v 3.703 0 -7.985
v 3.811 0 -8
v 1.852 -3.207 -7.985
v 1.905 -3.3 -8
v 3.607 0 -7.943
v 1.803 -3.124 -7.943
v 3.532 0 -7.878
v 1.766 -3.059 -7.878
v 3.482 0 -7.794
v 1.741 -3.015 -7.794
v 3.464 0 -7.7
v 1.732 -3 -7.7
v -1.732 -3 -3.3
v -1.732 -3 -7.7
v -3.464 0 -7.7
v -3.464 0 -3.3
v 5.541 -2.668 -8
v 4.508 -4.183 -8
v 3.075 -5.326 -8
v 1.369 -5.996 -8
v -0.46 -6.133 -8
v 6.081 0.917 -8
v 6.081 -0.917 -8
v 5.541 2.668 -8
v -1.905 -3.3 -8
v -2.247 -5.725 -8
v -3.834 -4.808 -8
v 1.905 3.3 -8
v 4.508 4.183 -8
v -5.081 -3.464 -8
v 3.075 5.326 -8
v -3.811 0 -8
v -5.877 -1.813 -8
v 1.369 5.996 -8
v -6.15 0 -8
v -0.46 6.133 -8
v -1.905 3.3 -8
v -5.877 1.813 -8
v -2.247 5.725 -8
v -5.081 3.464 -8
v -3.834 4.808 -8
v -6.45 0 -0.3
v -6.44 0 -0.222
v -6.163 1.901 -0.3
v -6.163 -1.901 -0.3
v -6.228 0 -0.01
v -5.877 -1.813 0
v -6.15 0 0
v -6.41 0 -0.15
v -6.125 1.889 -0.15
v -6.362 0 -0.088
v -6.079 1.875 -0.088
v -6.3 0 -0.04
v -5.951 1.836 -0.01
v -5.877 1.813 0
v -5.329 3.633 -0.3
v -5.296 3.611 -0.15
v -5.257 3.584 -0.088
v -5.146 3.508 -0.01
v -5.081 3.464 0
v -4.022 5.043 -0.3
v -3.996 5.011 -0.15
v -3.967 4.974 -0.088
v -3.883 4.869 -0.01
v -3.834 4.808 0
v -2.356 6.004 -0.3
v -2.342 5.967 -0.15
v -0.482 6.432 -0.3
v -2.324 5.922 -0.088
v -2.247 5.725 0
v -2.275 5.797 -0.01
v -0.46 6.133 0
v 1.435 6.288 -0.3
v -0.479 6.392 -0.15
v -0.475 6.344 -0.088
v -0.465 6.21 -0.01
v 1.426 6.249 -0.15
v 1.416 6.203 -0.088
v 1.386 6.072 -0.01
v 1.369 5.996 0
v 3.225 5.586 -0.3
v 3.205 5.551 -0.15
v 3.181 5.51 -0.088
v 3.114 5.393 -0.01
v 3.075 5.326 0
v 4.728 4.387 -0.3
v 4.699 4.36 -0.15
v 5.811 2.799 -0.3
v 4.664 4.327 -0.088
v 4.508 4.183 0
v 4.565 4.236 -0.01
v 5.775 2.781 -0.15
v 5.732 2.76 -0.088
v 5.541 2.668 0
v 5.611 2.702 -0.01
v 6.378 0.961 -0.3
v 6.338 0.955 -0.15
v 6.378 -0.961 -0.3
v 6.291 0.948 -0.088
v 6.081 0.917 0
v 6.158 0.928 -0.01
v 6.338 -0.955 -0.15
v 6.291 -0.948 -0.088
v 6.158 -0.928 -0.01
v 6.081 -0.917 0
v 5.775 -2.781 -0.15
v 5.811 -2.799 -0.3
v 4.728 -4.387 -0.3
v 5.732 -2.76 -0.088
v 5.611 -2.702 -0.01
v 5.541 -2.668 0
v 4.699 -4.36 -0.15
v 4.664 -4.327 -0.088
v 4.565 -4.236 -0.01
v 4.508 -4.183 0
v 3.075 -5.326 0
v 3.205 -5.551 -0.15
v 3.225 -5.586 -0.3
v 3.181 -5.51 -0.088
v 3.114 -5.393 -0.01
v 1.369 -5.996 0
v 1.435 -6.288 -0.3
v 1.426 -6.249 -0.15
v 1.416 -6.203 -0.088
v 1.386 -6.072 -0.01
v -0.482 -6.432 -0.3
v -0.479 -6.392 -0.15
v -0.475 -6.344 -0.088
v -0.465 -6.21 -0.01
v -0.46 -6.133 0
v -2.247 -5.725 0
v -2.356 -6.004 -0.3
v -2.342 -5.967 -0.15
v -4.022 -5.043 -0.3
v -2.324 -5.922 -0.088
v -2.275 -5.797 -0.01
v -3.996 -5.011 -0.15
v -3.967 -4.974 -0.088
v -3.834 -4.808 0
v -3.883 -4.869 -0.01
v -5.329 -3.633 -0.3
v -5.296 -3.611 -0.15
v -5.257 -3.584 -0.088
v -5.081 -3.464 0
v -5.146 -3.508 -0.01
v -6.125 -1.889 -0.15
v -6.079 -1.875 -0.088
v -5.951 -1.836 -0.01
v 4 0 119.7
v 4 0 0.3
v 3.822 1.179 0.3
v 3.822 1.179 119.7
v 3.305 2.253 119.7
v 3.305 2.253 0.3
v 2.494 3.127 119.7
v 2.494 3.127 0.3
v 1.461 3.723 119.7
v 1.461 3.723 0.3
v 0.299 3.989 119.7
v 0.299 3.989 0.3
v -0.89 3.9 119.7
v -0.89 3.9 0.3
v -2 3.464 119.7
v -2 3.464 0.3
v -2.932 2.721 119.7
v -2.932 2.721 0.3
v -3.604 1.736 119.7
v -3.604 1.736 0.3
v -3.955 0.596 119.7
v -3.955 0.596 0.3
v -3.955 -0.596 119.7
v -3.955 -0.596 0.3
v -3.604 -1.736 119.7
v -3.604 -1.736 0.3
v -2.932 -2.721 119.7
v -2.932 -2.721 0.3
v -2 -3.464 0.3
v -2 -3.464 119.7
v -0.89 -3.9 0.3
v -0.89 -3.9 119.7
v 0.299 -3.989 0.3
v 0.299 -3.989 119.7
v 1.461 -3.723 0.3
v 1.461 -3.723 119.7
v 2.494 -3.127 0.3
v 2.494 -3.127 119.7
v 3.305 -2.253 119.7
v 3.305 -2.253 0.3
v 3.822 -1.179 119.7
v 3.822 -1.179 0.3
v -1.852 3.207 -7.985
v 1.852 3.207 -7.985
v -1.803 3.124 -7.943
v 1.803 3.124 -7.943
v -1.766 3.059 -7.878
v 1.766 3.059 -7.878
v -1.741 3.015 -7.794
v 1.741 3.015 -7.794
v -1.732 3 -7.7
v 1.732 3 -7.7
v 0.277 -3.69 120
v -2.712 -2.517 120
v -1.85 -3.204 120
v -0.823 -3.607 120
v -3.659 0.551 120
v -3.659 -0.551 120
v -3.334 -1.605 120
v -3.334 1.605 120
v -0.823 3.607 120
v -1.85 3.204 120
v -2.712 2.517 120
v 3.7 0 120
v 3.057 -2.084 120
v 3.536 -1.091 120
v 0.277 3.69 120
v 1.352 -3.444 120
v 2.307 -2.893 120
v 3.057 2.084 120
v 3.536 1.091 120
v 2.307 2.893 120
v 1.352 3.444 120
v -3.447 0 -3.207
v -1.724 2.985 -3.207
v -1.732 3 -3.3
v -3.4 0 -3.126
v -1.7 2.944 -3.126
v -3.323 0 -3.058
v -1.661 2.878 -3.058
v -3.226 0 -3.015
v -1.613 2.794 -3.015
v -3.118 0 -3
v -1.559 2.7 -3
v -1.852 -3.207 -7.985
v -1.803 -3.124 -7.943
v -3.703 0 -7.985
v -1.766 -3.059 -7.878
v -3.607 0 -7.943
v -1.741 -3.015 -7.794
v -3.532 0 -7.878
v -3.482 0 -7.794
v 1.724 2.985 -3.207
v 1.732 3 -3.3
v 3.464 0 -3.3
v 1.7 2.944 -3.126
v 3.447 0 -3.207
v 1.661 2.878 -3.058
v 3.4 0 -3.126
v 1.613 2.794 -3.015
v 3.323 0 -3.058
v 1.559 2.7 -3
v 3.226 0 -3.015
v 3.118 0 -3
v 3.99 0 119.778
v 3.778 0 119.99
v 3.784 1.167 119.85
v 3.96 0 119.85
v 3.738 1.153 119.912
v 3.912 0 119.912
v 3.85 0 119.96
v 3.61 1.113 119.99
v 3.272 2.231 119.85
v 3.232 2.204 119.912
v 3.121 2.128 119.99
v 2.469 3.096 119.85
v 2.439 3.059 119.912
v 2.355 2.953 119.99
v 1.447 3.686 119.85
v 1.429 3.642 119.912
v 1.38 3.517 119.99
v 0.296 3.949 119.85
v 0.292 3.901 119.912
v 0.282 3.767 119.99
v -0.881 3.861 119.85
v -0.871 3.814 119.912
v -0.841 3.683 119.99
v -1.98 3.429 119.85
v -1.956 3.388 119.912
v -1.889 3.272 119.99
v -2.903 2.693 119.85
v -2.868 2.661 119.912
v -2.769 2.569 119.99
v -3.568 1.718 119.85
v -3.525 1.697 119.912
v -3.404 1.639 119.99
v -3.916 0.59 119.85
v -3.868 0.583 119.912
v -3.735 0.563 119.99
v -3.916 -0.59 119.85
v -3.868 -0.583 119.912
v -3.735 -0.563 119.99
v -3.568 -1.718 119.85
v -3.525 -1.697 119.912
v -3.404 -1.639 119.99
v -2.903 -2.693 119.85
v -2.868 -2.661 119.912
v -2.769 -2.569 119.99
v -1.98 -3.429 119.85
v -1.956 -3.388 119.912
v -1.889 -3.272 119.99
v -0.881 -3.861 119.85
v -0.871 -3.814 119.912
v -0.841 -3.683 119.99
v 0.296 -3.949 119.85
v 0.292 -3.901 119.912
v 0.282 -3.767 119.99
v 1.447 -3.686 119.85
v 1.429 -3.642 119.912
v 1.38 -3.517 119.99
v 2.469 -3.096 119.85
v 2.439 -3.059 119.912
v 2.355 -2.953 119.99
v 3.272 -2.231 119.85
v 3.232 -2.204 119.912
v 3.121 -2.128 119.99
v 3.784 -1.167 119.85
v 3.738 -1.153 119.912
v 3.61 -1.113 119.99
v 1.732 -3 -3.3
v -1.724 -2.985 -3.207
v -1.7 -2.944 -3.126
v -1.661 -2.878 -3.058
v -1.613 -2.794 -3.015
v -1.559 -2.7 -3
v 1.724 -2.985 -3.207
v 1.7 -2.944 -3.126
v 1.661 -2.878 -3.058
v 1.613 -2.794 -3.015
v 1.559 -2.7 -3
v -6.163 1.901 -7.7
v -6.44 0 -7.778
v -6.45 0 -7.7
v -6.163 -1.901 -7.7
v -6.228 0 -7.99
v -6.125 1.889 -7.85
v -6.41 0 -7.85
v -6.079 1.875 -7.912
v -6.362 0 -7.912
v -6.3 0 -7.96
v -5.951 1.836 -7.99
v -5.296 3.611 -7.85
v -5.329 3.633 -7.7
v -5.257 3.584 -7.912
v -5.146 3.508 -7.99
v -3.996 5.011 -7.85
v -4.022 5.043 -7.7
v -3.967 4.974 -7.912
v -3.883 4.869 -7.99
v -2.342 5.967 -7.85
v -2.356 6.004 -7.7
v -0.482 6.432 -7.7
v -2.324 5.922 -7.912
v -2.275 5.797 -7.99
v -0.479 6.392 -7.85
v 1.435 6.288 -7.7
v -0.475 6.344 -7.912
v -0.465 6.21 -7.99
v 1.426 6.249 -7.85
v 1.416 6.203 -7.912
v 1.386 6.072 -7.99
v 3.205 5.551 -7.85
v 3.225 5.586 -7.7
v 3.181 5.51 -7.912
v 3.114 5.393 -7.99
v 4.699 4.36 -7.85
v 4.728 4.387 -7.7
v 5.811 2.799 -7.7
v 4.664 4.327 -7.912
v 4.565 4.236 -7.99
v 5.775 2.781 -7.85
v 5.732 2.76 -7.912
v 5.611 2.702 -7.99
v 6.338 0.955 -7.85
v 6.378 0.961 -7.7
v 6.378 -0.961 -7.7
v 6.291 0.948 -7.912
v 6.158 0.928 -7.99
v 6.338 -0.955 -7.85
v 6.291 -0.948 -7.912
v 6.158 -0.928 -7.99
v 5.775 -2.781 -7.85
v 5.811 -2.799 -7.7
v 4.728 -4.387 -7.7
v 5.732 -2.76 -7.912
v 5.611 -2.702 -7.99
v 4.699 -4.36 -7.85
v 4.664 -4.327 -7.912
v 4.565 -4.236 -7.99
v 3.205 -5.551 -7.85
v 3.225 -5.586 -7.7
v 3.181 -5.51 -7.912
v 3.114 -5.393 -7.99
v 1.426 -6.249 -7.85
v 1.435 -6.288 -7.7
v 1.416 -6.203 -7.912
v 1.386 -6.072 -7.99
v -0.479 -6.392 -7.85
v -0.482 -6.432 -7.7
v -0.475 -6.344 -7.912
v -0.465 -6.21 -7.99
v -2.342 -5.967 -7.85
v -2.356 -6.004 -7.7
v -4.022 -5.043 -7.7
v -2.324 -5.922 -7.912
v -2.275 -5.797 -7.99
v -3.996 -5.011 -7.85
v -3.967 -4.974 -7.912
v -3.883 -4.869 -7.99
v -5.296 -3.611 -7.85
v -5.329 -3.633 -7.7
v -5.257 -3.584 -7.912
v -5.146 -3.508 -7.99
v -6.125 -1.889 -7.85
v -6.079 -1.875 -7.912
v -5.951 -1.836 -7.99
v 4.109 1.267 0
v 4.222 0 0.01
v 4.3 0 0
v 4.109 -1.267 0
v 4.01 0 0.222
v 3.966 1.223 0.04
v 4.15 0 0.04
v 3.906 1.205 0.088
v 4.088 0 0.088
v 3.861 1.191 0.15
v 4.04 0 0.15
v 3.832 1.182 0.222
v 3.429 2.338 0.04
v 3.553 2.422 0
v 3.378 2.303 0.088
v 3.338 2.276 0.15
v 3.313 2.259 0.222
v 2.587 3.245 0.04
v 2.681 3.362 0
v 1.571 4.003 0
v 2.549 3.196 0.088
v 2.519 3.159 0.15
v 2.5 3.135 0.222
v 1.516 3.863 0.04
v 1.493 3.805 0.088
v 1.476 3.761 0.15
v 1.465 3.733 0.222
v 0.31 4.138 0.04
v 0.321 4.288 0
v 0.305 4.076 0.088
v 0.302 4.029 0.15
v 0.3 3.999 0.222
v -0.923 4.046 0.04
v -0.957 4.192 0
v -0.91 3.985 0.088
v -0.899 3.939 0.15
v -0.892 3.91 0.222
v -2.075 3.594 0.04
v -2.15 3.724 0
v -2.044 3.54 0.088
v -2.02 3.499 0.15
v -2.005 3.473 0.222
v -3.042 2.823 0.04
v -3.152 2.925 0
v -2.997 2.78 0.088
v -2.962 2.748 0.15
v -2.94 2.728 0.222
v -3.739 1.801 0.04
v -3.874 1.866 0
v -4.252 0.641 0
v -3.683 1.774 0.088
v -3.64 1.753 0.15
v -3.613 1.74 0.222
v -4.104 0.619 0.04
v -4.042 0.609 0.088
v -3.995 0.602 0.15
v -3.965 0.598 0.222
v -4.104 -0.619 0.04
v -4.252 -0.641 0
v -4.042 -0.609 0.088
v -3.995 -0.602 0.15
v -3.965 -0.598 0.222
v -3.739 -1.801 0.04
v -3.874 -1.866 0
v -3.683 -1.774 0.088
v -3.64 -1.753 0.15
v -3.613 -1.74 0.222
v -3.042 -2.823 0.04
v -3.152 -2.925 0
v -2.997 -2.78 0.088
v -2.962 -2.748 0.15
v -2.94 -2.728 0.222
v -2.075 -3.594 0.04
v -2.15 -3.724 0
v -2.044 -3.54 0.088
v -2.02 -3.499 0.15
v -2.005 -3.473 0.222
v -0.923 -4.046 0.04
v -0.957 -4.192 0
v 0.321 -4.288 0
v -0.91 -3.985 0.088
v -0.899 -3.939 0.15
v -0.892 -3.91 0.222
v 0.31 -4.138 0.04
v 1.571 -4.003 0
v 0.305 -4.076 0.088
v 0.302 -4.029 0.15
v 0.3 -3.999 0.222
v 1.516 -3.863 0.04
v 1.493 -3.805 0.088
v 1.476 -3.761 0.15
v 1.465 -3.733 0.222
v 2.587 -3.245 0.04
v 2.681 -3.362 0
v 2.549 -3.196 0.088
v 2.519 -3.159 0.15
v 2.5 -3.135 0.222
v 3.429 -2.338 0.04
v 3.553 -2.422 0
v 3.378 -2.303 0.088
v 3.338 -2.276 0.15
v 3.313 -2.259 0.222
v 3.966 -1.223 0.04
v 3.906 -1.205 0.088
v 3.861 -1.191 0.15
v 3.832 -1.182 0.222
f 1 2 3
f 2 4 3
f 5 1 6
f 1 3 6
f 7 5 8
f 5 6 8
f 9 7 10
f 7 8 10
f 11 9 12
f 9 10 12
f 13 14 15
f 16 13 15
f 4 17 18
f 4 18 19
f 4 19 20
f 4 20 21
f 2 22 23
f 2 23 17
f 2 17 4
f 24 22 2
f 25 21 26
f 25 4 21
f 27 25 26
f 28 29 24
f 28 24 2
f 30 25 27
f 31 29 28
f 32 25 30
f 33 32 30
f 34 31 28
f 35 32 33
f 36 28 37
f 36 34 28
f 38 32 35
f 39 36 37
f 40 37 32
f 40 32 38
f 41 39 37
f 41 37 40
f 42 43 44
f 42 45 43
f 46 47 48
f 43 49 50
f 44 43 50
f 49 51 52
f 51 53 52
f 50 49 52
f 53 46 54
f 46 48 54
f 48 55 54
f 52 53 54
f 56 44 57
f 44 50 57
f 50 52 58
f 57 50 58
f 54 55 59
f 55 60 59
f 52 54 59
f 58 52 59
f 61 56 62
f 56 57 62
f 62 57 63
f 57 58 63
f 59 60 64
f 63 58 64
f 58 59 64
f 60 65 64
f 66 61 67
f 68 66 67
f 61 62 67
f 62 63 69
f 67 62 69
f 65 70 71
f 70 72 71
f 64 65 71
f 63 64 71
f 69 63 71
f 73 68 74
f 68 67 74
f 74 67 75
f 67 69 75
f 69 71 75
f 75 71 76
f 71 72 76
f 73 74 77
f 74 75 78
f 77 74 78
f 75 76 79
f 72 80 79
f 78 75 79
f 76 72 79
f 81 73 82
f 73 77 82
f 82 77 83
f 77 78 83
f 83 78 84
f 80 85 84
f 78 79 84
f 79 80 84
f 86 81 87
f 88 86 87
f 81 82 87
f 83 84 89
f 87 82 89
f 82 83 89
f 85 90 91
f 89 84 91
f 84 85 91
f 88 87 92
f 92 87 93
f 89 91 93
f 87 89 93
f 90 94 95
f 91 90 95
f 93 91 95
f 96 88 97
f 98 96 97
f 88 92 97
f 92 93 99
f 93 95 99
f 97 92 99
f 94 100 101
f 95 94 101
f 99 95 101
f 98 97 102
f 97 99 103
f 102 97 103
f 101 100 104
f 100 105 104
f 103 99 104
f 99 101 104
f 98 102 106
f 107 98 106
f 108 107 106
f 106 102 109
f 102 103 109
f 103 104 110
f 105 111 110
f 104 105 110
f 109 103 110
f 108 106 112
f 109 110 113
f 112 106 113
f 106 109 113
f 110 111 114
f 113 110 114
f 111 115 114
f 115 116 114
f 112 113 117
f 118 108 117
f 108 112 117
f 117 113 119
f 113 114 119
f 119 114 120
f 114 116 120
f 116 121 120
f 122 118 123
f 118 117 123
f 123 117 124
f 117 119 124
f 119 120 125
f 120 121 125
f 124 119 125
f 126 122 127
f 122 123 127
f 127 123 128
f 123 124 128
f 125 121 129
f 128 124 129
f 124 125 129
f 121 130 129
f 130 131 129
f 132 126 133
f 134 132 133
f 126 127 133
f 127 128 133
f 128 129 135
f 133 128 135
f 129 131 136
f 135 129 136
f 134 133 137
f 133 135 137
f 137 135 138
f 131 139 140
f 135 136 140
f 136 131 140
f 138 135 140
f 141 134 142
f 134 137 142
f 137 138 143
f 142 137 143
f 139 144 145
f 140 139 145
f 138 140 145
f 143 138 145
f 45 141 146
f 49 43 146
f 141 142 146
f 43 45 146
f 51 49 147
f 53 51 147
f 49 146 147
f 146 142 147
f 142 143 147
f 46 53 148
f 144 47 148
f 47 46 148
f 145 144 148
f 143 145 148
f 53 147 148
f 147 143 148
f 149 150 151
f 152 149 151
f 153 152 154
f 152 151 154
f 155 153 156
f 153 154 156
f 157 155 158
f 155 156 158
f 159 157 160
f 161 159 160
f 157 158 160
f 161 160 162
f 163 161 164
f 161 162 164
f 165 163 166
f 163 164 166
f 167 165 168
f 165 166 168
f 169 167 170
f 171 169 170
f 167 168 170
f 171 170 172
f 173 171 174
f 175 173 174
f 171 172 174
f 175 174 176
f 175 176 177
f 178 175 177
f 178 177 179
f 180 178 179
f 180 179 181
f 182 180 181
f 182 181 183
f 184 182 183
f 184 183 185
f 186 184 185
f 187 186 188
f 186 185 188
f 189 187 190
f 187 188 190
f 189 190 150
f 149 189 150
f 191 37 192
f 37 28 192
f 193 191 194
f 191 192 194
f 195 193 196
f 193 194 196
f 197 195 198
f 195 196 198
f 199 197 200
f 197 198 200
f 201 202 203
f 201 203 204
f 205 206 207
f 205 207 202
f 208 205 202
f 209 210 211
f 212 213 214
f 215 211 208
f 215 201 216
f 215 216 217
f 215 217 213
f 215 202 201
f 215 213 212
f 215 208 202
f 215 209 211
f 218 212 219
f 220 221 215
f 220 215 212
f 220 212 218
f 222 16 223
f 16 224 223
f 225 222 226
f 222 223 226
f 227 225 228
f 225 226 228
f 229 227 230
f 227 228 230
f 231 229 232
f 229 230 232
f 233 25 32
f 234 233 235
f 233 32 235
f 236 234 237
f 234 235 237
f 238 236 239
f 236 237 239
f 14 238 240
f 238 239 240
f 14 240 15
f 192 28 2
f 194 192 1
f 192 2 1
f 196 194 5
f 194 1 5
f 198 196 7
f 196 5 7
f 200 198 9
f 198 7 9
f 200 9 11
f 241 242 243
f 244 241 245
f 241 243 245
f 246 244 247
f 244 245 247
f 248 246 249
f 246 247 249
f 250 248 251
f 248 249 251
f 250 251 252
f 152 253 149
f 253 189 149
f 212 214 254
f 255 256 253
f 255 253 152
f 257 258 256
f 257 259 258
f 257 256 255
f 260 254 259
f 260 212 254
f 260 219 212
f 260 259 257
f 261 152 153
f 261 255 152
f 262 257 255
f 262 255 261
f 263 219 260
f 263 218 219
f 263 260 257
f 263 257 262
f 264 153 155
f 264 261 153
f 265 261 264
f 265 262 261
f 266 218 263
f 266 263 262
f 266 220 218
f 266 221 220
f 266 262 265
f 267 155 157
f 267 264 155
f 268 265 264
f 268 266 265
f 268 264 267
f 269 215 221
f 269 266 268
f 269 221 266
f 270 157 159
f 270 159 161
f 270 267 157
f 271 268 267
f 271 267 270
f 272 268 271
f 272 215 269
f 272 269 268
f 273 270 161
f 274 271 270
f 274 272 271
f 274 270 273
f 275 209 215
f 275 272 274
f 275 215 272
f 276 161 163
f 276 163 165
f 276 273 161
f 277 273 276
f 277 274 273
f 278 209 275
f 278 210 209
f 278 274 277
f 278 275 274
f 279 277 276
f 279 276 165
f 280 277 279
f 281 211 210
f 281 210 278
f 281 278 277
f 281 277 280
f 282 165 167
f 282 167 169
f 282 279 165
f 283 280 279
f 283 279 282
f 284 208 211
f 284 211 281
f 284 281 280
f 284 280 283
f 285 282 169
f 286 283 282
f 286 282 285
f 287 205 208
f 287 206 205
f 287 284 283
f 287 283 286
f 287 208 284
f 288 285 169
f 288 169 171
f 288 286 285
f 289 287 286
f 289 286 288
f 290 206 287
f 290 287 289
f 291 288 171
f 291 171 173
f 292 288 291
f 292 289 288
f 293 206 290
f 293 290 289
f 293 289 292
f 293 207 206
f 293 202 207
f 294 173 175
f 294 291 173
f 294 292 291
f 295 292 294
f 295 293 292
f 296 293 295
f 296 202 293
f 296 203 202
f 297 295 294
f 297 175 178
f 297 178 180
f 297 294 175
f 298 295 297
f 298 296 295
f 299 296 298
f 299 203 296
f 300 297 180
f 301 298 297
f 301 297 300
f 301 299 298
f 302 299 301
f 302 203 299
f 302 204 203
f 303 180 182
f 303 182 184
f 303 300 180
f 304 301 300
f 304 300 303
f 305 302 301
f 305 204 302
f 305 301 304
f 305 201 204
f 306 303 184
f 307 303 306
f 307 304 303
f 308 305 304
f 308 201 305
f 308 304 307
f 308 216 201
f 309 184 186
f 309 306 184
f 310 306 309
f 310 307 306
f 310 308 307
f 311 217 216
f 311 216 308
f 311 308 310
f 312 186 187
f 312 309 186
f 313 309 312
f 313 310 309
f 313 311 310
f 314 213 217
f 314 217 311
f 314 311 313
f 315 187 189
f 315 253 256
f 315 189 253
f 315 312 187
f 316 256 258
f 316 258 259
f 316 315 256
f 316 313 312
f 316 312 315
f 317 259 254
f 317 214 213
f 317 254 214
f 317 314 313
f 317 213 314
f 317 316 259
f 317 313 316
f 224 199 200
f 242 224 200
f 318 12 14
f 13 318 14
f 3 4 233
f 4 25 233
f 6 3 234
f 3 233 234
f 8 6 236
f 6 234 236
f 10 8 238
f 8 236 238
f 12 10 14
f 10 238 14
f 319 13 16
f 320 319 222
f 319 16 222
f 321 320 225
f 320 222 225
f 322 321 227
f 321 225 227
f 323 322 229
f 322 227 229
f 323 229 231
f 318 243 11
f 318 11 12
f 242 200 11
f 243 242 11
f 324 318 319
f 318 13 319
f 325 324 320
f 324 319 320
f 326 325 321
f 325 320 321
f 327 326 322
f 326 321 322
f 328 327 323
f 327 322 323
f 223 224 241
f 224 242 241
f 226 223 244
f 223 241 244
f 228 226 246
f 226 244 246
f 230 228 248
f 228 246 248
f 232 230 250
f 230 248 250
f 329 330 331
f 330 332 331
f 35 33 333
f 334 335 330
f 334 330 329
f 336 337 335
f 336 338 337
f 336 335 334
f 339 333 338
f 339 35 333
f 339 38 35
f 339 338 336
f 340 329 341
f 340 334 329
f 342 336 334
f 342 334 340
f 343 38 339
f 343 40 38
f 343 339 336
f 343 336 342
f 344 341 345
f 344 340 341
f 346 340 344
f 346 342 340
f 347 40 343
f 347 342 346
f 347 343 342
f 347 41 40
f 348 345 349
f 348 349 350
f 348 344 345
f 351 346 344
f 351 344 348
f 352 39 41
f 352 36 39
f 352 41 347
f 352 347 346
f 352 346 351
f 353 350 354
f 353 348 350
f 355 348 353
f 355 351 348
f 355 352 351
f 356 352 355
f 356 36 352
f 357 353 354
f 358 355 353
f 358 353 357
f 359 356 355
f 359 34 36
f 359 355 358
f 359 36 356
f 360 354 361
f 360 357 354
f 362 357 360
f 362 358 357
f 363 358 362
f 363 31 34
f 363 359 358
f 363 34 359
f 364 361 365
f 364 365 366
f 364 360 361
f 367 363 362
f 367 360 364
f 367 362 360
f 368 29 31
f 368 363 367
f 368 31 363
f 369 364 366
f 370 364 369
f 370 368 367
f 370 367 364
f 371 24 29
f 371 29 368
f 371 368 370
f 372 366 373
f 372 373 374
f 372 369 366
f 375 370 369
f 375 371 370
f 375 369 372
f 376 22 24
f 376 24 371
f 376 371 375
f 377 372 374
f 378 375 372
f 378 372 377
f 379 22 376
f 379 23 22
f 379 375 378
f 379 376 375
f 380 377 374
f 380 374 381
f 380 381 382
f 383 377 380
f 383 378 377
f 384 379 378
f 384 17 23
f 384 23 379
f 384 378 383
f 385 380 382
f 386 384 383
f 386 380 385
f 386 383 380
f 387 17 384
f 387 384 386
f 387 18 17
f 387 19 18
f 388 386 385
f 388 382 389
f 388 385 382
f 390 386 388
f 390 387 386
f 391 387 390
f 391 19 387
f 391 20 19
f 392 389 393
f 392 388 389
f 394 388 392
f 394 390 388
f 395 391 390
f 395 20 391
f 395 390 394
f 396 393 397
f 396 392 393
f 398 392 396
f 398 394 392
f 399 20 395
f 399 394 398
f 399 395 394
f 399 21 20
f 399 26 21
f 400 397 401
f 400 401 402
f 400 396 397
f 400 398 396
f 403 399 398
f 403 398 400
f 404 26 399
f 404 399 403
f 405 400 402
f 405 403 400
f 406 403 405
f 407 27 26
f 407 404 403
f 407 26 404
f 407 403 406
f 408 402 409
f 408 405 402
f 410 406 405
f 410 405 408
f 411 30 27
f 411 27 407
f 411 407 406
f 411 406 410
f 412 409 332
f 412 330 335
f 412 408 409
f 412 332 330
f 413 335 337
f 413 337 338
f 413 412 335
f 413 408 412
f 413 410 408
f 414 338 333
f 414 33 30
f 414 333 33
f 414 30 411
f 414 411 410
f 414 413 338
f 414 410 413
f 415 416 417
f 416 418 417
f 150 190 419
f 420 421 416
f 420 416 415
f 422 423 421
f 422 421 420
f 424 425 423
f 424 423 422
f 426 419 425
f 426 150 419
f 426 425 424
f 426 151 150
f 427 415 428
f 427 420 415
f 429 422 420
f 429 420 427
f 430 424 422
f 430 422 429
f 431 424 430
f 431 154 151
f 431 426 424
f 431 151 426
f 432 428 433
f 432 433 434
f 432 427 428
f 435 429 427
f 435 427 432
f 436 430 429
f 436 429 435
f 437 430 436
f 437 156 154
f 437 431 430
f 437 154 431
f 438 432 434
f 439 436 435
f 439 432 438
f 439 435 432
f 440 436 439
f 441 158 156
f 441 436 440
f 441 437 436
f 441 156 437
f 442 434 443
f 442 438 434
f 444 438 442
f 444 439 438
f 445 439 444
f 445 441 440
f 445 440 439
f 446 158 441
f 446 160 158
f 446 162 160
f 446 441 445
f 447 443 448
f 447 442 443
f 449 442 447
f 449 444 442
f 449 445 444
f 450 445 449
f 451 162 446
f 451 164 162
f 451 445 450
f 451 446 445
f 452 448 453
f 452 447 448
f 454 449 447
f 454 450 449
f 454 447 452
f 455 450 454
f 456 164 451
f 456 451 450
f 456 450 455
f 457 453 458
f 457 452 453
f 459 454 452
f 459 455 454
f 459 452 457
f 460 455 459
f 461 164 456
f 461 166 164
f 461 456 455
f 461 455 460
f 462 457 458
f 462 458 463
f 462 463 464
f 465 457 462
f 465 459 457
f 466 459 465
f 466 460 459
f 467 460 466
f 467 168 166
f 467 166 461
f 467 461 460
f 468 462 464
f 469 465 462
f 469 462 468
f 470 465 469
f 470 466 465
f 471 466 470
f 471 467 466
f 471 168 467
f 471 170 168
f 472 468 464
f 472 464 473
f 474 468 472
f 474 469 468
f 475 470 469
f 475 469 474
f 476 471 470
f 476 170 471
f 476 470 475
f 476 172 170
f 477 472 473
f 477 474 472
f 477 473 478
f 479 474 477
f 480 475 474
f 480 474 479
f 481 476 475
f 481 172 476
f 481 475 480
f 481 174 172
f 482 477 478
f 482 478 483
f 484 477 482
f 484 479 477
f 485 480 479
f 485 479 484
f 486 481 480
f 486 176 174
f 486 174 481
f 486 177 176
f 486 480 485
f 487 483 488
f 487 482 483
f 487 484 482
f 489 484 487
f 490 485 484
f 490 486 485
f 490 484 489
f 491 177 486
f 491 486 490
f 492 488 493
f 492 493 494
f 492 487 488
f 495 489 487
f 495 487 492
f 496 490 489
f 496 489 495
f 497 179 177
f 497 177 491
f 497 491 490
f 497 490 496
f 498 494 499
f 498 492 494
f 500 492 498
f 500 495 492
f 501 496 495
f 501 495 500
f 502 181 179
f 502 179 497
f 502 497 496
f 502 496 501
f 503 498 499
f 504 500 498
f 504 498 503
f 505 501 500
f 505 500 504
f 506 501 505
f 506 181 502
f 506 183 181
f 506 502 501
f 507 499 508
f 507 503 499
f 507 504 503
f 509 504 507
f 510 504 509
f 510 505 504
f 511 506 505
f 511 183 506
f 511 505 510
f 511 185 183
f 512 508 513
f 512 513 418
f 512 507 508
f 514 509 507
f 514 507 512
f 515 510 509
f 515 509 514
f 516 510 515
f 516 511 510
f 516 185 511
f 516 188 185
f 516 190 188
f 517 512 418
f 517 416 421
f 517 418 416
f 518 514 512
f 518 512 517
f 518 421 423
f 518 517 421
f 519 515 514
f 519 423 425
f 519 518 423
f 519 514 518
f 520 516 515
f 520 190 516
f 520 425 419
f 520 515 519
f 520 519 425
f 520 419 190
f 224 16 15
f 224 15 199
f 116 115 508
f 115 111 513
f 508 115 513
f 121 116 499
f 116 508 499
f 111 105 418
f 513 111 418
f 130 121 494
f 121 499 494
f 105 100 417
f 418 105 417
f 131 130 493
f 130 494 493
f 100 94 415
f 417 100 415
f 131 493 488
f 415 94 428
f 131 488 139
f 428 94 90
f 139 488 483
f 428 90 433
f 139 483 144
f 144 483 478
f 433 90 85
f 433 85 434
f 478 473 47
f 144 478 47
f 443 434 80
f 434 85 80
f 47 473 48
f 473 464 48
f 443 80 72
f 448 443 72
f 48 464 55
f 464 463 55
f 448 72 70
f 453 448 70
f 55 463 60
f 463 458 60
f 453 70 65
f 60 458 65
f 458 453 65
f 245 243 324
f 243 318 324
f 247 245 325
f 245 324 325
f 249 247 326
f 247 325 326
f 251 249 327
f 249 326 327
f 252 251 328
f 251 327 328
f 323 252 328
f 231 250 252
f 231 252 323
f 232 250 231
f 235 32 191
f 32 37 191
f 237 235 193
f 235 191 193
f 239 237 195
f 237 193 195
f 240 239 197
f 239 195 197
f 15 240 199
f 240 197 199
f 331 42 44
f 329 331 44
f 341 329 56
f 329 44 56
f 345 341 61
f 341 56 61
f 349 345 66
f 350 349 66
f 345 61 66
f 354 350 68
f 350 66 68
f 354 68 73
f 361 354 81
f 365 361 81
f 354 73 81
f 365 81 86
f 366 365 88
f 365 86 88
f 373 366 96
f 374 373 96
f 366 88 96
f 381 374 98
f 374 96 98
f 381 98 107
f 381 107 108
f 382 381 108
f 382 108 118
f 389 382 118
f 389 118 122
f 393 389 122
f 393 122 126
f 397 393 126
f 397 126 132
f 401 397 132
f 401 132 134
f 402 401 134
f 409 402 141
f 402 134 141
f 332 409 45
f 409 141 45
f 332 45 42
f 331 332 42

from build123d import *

# Parameters (mm, degrees)
SKETCH_1_R          = 4
EXTRUDE_1_DEPTH     = 120
SKETCH_3_R          = 6.45
EXTRUDE_2_DEPTH     = 8
CUT_EXTRUDE_1_DEPTH = 5
FILLET_1_R          = 0.3


with BuildPart() as part:
    # Эскиз1 → Бобышка-Вытянуть1 (new body)
    with BuildSketch(Plane.XY):
        Circle(SKETCH_1_R)
    extrude(amount=EXTRUDE_1_DEPTH)

    # Эскиз3 → Бобышка-Вытянуть2 (add)
    with BuildSketch(Plane(origin=(0, 0, 0), x_dir=(-1, 0, 0), z_dir=(0, 0, -1))):
        Circle(SKETCH_3_R)
    extrude(amount=EXTRUDE_2_DEPTH)

    # Эскиз4 → Вырез-Вытянуть1 (cut)
    with BuildSketch(Plane(origin=(0, 0, -8), x_dir=(-1, 0, 0), z_dir=(0, 0, -1))):
        Polygon((-3.464101615, 0), (-1.732050808, -3), (1.732050808, -3), (3.464101615, 0), (1.732050808, 3), (-1.732050808, 3), align=None)
    extrude(amount=-CUT_EXTRUDE_1_DEPTH, mode=Mode.SUBTRACT)

    # Скругление1
    fillet_1_edges = [part.edges().sort_by_distance(p)[0] for p in [
        (2.598076211, 1.5, -3),
        (0, 3, -3),
        (-2.598076211, 1.5, -3),
        (-2.598076211, -1.5, -3),
        (0, -3, -3),
        (2.598076211, -1.5, -3),
        (2.598076211, 1.5, -8),
        (2.598076211, -1.5, -8),
        (0, -3, -8),
        (-2.598076211, -1.5, -8),
        (-2.598076211, 1.5, -8),
        (0, 3, -8),
        (-4, 0, 120),
        (-4, 0, 0),
        (6.45, 0, 0),
        (6.45, 0, -8),
    ]]
    fillet(fillet_1_edges, radius=FILLET_1_R)


solid = part.part
